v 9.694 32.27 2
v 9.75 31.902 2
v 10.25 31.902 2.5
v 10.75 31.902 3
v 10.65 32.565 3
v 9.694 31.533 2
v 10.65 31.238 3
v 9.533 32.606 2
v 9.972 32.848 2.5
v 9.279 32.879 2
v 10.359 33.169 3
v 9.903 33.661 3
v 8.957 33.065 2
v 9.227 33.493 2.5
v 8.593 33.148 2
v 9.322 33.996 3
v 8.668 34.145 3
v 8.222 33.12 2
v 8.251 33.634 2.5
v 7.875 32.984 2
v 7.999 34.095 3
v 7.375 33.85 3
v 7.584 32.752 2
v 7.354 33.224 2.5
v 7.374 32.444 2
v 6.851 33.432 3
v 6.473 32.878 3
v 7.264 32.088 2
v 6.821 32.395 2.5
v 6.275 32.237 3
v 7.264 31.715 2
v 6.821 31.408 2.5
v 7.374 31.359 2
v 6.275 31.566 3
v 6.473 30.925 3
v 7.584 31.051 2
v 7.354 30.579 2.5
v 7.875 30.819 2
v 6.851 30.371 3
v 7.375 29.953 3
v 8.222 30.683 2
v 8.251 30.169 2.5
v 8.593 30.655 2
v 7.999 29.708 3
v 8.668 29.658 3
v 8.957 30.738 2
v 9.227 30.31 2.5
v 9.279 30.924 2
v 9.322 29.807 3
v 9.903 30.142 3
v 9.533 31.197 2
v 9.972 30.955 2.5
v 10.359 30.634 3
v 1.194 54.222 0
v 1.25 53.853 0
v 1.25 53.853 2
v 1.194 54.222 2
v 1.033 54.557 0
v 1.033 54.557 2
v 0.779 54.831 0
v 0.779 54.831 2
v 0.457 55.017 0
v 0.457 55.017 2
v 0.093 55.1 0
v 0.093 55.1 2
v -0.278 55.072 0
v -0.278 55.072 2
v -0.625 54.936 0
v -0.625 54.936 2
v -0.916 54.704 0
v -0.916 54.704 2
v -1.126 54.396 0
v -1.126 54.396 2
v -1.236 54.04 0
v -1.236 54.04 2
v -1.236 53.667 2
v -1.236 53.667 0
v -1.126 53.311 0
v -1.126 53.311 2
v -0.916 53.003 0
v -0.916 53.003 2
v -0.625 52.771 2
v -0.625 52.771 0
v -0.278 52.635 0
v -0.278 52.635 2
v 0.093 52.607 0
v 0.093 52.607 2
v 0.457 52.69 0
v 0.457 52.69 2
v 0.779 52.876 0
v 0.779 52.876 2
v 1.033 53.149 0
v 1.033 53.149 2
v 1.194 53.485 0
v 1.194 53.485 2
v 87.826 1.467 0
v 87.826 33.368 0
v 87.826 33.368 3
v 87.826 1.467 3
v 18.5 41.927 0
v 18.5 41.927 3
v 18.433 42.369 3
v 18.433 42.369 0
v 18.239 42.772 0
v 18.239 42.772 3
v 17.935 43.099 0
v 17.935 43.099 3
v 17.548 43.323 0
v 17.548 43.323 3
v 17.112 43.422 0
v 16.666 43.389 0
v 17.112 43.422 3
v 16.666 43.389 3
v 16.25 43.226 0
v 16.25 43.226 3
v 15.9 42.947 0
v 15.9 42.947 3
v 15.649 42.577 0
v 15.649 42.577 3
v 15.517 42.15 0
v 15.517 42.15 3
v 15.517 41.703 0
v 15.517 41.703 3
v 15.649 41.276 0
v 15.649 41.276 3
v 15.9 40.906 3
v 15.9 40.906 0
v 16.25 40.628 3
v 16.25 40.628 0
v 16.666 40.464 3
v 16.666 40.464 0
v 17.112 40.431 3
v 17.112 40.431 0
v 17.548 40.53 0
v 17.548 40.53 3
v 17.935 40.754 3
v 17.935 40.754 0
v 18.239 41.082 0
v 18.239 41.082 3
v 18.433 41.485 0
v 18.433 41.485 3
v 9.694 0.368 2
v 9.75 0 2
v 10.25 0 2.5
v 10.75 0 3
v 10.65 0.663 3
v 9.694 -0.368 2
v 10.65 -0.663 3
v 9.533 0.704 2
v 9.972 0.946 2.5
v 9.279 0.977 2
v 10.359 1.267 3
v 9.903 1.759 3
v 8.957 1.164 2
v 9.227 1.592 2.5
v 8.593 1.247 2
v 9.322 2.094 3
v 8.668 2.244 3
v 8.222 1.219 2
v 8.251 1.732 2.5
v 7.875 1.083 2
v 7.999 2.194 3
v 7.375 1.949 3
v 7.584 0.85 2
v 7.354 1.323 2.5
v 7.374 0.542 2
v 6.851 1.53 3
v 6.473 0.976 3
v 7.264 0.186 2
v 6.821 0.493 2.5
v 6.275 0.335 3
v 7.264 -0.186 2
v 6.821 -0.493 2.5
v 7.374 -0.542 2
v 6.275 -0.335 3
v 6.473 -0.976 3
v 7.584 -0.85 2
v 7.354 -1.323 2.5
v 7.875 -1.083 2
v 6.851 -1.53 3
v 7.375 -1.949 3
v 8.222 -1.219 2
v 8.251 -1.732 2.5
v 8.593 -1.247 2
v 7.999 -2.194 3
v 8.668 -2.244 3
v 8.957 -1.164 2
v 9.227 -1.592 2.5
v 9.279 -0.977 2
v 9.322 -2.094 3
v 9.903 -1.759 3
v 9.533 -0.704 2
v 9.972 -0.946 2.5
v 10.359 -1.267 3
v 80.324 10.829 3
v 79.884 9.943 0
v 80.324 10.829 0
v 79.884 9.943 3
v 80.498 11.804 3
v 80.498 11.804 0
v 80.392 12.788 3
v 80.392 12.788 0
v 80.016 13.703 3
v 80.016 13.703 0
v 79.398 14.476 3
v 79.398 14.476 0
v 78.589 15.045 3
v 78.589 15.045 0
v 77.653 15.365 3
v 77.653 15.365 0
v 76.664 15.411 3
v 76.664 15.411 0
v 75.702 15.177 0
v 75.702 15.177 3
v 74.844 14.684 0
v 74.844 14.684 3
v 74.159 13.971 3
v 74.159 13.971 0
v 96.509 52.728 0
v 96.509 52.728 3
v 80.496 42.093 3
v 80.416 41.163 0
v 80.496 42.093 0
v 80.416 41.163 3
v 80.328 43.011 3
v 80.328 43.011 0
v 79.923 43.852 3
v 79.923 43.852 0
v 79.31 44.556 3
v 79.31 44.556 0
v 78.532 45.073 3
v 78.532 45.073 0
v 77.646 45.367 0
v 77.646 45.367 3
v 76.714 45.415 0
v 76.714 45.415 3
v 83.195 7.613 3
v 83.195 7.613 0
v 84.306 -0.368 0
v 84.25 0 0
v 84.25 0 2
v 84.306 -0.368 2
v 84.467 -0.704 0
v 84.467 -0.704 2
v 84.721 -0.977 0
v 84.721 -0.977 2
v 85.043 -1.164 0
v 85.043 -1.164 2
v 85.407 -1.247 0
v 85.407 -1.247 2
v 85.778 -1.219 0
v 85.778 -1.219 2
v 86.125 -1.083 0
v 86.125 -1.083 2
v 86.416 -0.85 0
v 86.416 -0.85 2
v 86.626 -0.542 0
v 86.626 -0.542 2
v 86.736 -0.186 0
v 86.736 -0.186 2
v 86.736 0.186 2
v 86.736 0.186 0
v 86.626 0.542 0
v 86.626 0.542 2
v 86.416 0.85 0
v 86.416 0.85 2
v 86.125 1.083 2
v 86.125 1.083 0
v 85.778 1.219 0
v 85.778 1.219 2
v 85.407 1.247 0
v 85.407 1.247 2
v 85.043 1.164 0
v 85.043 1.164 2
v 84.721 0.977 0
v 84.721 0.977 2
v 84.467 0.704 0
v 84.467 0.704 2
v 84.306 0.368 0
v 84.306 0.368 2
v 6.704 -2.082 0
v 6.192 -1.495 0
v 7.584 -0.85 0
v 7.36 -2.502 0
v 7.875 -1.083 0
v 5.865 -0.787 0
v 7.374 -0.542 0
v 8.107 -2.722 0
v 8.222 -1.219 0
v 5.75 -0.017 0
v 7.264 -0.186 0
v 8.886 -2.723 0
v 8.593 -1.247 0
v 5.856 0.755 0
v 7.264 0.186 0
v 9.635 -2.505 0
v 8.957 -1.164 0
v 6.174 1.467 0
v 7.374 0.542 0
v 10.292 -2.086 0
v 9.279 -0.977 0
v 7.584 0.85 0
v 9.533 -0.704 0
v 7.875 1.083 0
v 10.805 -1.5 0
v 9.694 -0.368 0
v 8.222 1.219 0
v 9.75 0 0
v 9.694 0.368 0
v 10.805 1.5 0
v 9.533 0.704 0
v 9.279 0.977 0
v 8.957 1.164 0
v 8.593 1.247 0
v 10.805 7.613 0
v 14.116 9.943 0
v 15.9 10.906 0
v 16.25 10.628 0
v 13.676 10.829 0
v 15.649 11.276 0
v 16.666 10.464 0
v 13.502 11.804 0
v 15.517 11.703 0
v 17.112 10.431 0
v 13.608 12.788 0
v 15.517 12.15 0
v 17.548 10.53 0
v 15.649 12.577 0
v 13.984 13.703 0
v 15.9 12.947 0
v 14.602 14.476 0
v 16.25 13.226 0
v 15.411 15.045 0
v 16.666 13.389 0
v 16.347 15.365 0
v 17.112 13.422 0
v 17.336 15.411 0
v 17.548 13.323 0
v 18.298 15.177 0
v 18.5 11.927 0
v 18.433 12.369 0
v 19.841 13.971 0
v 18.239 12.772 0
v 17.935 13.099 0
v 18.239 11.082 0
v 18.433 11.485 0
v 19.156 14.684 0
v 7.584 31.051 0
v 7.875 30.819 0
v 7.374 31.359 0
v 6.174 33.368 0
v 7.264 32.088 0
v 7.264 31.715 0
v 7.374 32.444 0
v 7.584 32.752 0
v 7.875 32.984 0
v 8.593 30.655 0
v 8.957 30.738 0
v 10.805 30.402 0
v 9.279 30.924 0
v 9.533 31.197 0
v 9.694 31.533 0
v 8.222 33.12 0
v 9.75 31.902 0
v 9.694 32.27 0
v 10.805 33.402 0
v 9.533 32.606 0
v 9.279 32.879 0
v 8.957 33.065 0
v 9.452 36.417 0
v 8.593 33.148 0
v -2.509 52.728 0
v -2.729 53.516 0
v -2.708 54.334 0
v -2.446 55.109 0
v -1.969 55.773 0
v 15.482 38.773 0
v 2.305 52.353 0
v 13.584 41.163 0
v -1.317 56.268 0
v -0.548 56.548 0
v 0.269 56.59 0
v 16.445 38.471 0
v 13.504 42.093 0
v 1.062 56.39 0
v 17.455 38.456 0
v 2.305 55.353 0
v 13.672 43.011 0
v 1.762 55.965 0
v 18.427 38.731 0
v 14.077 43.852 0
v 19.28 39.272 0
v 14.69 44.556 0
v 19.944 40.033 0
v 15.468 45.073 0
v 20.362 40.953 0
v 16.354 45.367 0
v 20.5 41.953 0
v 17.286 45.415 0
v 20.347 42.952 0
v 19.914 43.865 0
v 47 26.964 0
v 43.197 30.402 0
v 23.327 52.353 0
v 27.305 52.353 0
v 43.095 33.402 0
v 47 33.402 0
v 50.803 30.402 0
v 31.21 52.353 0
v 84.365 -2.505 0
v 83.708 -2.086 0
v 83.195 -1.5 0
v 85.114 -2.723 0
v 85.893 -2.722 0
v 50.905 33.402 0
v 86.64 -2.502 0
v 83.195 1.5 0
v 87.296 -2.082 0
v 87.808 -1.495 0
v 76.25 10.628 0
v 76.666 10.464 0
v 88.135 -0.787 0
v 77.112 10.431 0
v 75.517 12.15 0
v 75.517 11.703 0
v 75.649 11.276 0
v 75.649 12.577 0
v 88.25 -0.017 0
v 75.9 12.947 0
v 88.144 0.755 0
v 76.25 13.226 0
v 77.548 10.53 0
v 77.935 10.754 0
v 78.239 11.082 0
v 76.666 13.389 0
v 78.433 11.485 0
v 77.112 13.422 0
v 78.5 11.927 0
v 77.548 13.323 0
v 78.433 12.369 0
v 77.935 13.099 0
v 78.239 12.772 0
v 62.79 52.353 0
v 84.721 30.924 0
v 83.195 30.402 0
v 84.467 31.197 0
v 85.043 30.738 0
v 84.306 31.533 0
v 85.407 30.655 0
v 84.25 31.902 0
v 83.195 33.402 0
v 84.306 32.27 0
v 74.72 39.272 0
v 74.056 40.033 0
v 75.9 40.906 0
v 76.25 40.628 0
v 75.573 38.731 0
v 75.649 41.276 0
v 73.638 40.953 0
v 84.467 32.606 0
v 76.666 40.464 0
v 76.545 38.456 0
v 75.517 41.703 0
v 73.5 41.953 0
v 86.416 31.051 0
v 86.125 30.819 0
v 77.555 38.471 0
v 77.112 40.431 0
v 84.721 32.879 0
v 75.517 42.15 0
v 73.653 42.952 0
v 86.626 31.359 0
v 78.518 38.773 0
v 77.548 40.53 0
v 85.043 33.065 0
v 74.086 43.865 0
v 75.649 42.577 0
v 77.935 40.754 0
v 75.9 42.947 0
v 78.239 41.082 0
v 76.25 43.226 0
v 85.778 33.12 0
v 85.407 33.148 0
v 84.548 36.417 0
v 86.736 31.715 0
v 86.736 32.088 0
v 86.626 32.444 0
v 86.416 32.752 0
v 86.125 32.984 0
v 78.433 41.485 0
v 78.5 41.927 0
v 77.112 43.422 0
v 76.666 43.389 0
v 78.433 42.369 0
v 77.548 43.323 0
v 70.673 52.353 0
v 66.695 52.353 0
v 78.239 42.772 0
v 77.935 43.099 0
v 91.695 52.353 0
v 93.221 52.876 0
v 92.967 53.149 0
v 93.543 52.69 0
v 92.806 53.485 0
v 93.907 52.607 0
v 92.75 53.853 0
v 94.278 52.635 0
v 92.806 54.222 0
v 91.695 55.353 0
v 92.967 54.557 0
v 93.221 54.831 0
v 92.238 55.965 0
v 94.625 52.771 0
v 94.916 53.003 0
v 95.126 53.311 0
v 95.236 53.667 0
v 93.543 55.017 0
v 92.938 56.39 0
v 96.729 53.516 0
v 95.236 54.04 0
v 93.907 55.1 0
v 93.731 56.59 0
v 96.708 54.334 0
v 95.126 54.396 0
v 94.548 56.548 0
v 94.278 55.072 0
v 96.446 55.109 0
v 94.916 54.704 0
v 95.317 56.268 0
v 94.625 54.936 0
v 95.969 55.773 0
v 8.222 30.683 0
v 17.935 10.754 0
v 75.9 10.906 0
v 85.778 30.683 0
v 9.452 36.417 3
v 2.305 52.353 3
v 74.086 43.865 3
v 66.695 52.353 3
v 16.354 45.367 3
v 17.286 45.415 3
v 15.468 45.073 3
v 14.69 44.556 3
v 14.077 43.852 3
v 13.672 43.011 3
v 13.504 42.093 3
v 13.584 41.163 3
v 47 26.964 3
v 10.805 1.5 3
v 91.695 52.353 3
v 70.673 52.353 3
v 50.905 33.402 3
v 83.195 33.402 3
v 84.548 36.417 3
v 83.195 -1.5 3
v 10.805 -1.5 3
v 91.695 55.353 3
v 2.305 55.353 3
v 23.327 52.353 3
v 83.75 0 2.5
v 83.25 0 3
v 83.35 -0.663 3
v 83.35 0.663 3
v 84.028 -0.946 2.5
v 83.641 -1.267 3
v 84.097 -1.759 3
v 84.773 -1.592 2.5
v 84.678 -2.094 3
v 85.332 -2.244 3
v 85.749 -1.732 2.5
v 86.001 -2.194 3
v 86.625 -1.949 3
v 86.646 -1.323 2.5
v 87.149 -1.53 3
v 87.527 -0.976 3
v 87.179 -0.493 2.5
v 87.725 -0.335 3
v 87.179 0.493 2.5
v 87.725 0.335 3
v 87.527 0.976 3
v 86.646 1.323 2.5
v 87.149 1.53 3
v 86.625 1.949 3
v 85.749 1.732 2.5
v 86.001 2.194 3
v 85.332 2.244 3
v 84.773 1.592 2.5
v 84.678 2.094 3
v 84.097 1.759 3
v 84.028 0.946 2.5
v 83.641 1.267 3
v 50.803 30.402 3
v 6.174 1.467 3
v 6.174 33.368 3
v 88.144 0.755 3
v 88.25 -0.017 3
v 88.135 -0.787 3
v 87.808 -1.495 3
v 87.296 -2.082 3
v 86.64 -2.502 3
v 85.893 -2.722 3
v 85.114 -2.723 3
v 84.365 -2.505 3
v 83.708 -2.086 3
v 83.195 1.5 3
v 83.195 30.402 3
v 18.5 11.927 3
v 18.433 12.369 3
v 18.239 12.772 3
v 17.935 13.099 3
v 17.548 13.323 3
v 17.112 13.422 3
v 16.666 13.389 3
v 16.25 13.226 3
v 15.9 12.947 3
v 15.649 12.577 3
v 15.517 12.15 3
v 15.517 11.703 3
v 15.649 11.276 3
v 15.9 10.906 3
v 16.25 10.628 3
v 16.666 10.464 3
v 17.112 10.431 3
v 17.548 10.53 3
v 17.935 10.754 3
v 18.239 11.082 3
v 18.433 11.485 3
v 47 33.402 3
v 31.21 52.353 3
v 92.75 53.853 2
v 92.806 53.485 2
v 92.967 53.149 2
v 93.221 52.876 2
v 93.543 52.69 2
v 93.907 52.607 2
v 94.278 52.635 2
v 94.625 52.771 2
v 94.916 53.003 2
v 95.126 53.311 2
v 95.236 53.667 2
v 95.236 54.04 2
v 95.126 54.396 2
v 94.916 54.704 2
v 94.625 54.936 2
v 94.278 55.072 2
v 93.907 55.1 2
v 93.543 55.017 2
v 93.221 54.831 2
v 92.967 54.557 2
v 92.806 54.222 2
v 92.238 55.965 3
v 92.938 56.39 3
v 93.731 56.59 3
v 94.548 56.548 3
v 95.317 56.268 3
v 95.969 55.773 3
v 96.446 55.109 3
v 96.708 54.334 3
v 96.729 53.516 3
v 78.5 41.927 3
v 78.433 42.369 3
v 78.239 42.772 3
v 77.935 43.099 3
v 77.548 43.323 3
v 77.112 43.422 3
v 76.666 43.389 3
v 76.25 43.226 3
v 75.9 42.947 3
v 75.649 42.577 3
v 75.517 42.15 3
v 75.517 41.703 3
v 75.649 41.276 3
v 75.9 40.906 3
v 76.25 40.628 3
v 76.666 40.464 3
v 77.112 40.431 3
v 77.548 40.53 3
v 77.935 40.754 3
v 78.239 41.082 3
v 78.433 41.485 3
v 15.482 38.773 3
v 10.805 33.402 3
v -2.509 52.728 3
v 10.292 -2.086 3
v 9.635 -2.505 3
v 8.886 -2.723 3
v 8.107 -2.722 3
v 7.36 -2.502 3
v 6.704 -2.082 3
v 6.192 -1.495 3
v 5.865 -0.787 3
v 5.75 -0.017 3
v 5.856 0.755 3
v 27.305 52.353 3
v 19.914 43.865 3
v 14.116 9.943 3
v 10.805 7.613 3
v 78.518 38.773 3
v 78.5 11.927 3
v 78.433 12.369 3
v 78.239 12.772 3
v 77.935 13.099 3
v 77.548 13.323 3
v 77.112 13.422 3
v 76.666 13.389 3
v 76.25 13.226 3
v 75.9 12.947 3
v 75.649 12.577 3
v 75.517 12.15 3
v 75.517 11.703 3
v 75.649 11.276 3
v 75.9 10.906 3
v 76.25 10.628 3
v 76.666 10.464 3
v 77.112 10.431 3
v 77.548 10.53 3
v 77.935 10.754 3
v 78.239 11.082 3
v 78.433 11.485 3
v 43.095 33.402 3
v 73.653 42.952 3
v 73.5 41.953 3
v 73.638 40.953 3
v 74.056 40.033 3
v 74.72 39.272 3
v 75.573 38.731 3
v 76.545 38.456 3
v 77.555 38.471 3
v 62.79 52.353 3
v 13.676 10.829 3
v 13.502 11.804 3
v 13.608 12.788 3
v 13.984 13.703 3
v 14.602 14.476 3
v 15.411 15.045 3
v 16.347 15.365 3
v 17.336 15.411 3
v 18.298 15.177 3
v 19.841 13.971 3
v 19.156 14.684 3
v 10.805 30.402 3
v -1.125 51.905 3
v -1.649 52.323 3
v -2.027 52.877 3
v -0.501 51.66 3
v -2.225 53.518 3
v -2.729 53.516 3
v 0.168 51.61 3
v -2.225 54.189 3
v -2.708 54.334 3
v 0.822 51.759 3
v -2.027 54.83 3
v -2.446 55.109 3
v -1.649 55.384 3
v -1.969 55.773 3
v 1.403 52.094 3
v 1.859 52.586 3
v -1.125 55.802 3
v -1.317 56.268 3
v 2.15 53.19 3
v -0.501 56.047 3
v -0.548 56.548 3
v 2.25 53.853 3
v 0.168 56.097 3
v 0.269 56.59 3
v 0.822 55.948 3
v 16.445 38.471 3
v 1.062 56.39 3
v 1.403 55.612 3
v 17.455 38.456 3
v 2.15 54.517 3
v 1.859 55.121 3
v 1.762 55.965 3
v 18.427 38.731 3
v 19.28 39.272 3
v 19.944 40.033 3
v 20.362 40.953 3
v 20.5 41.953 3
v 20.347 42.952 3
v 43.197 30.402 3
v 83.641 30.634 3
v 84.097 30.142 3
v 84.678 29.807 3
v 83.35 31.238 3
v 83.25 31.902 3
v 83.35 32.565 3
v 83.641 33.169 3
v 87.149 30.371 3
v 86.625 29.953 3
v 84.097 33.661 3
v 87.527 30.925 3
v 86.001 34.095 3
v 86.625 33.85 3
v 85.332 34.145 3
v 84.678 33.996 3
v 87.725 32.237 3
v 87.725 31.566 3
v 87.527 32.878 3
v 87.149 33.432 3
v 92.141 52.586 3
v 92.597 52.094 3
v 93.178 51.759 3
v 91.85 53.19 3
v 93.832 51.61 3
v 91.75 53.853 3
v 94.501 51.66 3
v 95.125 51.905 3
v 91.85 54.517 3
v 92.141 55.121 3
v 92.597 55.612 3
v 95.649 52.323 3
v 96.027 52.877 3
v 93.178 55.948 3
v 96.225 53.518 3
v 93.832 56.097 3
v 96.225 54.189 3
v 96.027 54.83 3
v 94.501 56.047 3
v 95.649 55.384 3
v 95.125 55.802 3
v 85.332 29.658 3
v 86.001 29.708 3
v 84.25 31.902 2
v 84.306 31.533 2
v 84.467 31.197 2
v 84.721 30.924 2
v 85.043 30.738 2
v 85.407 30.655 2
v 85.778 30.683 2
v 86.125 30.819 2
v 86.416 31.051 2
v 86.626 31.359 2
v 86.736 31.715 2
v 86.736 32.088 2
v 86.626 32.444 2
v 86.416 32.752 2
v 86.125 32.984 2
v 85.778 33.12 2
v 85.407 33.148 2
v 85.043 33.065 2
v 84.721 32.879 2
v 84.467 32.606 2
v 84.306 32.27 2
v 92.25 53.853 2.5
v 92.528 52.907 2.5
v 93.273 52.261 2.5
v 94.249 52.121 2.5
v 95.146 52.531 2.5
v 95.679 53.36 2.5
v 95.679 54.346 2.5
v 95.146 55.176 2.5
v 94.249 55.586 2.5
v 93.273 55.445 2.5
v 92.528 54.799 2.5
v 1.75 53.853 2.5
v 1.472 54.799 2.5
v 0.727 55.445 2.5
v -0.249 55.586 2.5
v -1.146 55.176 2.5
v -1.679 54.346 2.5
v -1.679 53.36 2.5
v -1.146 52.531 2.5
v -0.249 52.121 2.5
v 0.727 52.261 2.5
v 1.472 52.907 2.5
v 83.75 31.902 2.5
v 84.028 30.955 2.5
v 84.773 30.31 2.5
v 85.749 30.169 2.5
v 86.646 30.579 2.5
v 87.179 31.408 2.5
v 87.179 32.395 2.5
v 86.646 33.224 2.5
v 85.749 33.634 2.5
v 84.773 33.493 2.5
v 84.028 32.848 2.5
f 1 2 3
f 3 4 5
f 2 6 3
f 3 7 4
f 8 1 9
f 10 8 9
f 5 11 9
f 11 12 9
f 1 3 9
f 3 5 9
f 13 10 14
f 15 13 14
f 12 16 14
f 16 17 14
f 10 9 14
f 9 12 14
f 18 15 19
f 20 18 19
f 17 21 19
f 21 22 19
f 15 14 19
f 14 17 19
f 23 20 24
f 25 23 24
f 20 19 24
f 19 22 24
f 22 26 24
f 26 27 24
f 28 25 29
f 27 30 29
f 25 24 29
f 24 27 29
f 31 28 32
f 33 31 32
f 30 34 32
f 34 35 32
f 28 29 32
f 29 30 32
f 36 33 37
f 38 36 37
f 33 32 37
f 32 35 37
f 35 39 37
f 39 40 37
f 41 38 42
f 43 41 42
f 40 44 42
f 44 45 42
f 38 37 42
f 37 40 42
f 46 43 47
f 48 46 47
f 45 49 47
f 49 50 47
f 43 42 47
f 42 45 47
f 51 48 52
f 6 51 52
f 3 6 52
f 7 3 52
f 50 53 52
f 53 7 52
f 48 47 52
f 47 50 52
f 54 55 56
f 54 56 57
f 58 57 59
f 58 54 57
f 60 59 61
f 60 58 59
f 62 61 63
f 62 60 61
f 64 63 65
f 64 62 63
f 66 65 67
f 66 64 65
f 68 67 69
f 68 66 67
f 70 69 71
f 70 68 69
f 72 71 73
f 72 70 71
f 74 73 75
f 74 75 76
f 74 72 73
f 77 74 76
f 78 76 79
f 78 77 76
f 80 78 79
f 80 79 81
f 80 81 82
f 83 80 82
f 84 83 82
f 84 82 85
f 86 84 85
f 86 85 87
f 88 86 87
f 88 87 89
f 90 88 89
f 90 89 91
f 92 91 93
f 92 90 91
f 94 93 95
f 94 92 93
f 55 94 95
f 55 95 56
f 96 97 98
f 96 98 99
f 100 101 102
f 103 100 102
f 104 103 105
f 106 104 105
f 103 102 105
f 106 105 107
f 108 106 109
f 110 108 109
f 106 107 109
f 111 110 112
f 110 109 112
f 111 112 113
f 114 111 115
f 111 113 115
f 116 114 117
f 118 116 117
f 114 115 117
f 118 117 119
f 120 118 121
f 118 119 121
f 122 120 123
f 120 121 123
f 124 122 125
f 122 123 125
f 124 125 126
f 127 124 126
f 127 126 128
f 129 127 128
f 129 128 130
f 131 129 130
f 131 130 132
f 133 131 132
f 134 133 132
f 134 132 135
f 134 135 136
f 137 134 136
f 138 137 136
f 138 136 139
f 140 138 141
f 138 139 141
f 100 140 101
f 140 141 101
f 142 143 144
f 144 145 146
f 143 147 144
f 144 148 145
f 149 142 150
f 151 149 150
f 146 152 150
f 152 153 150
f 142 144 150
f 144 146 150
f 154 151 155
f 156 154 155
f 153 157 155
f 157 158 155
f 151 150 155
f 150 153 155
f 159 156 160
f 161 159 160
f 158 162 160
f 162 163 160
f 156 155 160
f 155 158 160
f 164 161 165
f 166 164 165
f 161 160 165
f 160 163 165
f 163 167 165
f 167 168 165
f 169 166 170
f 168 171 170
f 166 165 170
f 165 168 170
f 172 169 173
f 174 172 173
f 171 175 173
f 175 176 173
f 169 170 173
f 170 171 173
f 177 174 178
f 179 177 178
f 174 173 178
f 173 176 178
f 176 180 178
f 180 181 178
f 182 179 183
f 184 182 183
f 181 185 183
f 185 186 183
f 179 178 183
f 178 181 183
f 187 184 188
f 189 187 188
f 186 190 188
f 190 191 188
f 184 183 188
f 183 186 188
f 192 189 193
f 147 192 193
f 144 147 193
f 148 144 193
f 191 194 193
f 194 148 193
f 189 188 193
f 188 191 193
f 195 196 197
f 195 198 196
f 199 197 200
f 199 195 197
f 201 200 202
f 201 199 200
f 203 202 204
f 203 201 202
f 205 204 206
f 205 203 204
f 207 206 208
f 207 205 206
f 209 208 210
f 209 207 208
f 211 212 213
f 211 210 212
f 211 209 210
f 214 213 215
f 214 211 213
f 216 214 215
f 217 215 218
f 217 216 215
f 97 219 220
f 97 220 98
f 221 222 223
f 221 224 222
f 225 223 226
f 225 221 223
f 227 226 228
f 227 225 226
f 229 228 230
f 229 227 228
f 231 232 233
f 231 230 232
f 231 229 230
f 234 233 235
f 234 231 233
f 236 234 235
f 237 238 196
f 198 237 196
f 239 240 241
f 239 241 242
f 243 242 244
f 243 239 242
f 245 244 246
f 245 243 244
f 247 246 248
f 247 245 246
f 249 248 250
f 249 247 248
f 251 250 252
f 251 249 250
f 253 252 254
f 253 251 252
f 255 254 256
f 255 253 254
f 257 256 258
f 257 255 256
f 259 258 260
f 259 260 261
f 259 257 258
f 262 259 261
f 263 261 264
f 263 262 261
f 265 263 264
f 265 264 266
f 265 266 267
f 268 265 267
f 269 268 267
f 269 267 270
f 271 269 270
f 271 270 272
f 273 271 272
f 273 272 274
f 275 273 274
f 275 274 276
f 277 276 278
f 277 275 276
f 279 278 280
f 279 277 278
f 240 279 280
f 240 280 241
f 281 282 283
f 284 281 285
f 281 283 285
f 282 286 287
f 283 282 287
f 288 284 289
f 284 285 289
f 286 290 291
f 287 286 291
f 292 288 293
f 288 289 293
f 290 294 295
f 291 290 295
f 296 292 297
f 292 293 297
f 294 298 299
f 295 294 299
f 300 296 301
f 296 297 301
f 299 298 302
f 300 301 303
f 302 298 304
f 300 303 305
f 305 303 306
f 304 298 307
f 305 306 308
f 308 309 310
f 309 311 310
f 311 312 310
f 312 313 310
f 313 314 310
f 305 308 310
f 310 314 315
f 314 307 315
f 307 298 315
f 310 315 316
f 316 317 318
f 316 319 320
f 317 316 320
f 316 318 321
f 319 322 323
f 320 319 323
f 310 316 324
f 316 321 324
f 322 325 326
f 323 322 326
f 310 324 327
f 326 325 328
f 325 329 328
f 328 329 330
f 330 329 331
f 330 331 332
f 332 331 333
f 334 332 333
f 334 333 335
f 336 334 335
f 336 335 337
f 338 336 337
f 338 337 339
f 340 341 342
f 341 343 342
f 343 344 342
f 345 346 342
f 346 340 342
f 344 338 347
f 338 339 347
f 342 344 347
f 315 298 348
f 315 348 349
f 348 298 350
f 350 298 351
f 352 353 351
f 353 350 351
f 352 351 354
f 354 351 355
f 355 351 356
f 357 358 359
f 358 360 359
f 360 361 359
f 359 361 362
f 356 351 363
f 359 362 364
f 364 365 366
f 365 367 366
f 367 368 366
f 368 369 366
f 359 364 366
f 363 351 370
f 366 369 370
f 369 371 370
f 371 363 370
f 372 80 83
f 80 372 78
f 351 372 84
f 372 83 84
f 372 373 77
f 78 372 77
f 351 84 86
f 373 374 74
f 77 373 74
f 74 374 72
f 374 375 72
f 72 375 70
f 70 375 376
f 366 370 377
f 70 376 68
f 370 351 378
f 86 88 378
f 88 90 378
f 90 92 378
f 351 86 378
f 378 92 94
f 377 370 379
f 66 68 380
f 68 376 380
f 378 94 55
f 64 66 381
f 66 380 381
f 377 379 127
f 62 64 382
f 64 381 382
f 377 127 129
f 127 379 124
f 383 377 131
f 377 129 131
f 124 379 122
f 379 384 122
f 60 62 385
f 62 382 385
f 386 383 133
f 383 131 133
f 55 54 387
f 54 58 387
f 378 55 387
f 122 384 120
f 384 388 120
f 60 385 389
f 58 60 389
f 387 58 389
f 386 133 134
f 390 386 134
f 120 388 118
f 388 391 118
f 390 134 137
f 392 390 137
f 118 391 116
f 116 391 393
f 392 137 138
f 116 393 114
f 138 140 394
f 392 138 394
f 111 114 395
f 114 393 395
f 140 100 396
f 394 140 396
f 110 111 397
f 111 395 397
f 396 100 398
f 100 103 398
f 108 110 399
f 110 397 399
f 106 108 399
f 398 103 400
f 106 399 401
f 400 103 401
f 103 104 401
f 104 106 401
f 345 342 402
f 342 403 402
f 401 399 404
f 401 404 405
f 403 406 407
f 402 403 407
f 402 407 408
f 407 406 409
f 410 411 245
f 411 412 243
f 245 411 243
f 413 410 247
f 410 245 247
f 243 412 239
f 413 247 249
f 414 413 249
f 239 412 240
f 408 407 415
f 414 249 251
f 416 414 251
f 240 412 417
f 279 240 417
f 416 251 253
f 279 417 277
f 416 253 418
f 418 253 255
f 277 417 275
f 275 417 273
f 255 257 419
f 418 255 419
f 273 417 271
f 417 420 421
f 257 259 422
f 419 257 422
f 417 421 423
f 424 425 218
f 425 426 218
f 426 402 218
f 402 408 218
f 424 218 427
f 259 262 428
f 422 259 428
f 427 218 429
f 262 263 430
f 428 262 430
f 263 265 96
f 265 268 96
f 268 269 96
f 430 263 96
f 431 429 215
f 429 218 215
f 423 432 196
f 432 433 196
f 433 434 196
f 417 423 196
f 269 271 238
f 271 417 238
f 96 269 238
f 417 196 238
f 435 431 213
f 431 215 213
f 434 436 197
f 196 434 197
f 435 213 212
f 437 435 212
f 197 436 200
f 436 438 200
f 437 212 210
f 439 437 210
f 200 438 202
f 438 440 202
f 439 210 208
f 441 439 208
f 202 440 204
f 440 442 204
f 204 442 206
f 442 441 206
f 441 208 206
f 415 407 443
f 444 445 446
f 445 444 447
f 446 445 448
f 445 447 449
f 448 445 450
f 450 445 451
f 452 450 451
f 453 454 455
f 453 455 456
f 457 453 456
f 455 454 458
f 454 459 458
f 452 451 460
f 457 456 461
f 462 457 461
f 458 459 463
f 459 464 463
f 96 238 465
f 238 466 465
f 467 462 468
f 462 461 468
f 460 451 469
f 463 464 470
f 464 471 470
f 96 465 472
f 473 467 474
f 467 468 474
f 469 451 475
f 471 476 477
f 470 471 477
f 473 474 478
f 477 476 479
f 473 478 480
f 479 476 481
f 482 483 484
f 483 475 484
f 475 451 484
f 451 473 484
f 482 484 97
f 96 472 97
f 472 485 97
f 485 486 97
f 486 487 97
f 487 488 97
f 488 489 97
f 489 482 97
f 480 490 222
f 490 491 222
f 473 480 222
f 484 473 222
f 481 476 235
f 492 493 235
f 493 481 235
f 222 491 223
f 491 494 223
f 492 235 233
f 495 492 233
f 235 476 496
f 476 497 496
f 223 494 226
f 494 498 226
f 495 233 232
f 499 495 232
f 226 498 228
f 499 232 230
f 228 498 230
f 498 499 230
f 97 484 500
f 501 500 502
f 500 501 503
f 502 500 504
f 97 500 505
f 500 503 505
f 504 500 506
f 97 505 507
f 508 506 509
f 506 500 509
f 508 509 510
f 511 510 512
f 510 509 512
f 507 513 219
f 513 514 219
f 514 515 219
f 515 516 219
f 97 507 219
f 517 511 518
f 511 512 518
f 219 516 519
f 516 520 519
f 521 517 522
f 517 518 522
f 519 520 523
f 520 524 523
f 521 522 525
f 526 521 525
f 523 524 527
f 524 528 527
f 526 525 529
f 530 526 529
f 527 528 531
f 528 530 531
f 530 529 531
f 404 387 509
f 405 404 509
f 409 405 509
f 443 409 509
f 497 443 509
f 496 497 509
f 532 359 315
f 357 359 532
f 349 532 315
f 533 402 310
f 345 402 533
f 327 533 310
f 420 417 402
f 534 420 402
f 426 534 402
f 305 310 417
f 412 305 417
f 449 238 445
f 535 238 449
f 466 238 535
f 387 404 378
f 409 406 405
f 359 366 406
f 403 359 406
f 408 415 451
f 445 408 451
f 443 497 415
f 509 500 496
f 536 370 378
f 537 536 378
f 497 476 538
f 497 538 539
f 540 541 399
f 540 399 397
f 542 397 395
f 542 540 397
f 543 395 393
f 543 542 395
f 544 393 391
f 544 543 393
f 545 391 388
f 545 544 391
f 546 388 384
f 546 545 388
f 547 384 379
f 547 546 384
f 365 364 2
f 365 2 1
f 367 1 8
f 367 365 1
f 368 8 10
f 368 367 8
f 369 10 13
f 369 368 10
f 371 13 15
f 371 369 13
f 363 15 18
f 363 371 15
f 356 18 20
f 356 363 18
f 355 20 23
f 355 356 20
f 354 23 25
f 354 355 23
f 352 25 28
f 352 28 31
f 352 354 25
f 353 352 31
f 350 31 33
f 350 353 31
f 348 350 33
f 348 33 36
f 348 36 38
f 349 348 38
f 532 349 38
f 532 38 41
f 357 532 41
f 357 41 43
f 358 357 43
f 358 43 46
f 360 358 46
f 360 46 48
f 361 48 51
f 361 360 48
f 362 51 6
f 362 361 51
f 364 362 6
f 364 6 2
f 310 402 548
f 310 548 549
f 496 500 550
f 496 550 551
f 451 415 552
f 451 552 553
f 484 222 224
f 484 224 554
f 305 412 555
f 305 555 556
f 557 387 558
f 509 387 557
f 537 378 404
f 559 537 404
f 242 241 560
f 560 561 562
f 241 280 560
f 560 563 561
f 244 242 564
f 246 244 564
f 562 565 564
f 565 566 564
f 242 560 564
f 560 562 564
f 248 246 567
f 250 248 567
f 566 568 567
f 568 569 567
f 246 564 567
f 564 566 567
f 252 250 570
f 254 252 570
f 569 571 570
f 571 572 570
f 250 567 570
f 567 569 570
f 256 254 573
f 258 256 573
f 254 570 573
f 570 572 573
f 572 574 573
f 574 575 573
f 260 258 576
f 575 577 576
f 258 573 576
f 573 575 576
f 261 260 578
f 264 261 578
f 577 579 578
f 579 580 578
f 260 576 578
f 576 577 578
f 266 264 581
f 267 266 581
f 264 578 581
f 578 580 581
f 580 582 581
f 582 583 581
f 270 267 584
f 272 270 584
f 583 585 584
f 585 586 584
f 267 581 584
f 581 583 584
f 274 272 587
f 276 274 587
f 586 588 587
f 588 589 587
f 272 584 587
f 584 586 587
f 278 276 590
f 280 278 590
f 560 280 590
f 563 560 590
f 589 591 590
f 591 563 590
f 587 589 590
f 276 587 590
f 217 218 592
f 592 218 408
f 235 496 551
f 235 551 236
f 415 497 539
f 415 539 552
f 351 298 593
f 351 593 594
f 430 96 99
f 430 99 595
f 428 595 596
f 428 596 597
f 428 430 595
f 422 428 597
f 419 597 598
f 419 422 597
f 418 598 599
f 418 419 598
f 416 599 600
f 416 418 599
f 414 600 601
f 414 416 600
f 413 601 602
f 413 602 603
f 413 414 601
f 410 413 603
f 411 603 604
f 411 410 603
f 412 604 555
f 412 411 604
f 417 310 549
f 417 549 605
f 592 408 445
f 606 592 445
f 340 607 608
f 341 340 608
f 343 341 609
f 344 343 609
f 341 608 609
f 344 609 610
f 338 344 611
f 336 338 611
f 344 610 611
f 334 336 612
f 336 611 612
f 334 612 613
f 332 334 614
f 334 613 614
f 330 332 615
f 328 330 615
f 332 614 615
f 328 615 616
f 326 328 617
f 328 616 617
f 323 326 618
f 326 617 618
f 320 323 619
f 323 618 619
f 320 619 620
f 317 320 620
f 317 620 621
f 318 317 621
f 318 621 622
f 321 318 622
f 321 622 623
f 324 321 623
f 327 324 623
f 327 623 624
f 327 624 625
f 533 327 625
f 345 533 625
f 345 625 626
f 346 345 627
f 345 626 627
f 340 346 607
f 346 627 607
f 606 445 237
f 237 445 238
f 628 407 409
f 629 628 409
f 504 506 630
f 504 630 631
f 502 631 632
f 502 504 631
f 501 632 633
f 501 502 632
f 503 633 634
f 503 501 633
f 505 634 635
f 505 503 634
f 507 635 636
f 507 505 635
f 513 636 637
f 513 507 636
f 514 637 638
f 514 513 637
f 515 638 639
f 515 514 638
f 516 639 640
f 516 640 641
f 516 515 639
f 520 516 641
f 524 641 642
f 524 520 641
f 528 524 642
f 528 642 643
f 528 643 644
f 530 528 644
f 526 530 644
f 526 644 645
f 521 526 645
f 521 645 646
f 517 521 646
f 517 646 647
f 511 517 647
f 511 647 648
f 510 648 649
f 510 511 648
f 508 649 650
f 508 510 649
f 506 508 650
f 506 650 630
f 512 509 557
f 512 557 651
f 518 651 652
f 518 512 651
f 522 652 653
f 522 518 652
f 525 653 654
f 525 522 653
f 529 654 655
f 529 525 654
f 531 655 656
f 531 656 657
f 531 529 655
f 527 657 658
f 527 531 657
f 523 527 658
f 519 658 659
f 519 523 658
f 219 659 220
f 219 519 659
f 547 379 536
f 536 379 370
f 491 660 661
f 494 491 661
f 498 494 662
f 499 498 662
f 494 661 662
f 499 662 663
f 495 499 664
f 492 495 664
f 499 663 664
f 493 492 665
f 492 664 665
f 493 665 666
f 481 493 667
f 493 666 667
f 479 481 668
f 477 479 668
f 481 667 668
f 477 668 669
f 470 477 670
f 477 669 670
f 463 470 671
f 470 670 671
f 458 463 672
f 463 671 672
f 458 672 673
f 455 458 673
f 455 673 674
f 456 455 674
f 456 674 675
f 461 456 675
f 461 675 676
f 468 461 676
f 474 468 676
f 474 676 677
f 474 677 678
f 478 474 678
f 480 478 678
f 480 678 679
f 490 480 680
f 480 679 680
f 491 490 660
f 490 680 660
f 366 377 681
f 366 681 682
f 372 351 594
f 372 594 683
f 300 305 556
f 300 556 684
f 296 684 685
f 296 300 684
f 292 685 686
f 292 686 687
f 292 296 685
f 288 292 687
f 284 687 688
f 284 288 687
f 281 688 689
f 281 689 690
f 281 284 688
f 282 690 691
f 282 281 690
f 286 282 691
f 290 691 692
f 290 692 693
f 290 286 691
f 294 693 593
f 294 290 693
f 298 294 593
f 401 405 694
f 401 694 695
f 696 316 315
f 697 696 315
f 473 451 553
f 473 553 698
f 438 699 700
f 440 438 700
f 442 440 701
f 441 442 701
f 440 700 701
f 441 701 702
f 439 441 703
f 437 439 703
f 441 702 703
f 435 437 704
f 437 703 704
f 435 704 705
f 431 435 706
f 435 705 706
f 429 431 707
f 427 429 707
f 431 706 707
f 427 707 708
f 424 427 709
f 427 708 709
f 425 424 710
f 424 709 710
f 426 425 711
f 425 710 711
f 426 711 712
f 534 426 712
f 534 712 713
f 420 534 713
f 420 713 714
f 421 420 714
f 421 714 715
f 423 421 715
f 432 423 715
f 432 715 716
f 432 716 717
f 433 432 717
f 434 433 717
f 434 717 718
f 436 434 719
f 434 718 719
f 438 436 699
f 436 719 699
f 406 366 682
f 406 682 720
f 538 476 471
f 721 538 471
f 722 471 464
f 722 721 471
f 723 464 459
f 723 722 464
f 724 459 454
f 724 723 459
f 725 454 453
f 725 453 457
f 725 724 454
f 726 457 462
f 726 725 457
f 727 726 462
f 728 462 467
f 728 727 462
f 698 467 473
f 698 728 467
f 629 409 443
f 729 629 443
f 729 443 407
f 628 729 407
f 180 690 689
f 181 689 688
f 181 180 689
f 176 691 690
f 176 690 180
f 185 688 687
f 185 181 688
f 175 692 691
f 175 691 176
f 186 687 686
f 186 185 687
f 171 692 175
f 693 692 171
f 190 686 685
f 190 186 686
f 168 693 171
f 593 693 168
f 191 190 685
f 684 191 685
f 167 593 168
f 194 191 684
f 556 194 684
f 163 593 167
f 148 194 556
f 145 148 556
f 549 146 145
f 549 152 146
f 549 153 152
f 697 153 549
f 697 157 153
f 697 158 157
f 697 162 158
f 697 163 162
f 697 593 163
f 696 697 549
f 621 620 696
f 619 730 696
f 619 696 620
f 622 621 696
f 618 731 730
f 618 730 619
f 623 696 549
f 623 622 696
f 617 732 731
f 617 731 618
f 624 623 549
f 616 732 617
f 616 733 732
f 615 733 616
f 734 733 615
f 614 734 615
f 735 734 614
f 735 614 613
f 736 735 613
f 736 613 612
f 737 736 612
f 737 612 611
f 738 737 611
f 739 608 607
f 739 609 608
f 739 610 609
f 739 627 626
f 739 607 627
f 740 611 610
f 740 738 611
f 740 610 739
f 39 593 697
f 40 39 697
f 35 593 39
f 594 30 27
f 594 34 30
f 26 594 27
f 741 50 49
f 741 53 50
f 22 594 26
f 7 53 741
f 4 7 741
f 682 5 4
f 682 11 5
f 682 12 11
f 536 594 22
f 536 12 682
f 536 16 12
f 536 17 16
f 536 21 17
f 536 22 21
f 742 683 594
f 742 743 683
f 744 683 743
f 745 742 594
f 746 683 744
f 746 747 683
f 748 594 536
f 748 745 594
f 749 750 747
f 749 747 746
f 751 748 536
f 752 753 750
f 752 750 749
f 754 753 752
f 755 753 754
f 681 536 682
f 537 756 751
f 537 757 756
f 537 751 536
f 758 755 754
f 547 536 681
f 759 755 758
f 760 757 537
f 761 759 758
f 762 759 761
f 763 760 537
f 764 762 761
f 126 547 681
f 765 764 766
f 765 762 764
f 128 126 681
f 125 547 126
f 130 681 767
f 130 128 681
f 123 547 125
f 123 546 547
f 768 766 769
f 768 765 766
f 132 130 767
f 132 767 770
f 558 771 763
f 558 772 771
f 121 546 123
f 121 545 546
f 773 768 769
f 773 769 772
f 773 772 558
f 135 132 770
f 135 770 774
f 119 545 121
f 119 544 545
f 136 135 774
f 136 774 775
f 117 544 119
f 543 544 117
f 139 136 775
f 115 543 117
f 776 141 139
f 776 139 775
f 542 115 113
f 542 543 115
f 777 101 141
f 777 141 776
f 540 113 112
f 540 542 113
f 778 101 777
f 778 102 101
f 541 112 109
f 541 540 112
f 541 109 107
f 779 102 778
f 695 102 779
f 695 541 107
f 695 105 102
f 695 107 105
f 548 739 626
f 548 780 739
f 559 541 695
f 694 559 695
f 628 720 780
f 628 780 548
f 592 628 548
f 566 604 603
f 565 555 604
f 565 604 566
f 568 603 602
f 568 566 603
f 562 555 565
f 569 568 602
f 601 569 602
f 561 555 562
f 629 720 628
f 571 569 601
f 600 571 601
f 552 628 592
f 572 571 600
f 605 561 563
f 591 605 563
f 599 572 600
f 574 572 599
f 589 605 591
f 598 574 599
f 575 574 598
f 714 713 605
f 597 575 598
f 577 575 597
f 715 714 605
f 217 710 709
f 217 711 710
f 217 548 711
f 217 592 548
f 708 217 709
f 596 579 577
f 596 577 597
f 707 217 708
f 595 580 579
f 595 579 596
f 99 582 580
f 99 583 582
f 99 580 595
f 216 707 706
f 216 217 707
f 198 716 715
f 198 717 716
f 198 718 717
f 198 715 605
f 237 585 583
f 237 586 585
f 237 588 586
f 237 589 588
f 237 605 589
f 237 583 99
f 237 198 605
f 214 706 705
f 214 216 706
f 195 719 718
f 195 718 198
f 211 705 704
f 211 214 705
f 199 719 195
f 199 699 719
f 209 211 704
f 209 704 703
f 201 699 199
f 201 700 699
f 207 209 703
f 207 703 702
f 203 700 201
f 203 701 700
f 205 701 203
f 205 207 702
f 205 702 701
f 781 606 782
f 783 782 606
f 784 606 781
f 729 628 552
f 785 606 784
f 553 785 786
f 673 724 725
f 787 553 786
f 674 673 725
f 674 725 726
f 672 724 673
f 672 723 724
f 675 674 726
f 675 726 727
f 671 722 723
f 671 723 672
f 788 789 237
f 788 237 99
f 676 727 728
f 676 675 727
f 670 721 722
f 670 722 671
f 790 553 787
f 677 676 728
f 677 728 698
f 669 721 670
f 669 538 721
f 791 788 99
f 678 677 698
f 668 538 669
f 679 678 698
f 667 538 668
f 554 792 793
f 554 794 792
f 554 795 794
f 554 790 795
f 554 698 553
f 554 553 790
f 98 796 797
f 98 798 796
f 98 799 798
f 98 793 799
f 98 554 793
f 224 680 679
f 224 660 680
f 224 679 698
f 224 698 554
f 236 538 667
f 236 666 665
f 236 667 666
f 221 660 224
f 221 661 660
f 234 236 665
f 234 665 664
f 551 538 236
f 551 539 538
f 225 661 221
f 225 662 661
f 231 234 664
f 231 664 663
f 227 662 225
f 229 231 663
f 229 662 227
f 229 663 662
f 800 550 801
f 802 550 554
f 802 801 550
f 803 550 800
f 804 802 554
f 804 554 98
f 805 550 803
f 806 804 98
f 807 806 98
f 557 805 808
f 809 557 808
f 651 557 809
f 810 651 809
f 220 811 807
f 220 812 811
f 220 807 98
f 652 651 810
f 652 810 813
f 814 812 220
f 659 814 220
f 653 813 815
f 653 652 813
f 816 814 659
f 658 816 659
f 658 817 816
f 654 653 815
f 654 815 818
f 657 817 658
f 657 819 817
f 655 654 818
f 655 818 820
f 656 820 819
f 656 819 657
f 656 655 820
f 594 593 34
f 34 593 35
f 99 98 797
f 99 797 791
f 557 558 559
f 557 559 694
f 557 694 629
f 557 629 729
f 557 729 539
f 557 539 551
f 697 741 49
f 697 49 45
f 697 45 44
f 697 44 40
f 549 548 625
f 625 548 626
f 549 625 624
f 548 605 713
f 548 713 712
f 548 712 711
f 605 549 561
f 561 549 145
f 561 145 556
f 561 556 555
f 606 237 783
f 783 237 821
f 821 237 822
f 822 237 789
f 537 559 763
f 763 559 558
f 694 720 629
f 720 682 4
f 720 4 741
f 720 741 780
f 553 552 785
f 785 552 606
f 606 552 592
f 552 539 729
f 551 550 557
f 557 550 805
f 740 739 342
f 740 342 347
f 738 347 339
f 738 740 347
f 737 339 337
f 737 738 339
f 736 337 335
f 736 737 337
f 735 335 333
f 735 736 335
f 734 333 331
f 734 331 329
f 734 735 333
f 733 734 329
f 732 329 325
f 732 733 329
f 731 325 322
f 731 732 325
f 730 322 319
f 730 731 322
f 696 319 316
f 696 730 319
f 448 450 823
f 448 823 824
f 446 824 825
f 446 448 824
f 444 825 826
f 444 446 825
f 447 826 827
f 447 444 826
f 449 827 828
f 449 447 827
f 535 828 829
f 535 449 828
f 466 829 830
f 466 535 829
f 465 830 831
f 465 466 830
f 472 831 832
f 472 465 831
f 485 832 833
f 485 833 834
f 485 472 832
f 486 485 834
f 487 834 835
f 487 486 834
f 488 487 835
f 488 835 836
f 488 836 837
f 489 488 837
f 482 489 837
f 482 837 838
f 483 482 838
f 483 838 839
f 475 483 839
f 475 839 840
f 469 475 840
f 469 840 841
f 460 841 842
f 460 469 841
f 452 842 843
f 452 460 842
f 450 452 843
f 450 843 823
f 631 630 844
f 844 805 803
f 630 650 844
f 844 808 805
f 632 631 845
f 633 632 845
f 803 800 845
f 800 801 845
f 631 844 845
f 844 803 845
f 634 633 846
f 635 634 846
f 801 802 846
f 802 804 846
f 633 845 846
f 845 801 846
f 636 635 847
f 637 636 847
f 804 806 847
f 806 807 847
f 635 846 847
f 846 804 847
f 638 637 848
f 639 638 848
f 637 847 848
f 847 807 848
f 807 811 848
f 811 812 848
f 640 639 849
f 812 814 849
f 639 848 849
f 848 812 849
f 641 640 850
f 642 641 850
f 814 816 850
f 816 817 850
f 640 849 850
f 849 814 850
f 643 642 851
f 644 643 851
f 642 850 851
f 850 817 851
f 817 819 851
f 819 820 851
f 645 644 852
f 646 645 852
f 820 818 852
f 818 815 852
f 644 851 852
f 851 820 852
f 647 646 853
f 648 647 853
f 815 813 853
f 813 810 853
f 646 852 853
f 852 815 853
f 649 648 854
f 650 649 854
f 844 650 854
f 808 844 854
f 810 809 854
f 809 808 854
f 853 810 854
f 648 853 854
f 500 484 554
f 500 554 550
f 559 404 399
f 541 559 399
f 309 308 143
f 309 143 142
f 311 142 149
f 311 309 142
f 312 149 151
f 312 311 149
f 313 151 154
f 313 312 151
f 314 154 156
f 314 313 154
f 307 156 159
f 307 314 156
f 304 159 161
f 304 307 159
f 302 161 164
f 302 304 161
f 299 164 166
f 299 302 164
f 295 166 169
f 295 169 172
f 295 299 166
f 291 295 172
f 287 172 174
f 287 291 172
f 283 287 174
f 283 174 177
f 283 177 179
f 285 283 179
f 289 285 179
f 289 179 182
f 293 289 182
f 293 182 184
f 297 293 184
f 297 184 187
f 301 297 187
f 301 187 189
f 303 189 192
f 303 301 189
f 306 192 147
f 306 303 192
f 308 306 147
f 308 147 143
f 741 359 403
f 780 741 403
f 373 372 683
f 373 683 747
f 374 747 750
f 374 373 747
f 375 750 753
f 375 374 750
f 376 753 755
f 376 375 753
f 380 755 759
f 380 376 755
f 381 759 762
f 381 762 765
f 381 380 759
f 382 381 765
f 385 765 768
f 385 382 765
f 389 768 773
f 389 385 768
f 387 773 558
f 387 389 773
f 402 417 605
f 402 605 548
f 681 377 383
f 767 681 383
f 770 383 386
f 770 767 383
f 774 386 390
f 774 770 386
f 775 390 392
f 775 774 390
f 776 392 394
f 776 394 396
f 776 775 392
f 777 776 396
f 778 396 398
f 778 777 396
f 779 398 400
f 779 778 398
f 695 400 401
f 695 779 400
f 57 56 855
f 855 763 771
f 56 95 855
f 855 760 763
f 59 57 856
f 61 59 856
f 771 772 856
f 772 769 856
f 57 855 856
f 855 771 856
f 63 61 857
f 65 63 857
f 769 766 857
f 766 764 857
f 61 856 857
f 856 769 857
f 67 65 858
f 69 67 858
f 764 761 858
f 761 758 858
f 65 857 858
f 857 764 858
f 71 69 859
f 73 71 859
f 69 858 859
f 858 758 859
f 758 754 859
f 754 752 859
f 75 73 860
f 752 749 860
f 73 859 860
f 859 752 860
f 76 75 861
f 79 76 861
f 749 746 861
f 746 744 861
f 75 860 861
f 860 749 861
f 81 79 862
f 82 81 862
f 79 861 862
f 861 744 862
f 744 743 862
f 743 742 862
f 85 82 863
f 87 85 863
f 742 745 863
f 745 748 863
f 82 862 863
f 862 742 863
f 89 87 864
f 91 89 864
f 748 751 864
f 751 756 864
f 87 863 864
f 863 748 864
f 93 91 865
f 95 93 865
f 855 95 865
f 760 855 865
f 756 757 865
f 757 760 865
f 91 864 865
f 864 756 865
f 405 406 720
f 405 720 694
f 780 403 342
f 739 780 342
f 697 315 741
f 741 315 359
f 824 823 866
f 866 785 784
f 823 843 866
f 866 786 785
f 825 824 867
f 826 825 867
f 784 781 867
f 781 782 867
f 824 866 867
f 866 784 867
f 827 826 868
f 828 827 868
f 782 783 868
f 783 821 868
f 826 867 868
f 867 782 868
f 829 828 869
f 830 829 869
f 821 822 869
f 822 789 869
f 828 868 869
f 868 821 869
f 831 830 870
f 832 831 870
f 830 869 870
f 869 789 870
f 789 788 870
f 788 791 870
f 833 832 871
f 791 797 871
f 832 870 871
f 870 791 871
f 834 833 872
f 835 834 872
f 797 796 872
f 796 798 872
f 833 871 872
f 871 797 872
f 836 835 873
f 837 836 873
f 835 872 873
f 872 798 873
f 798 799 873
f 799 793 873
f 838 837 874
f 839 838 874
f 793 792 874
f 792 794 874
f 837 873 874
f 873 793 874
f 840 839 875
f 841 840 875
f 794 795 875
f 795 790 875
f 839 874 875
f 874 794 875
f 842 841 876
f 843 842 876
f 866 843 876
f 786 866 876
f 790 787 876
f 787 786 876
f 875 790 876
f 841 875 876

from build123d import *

# Parameters (mm, degrees)
SKETCH1_R           = 1.25
BOSS_EXTRUDE1_DEPTH = 3
CHAMFER1_SIZE       = 1
SKETCH2_R           = 3.5
BOSS_EXTRUDE2_DEPTH = 3
SKETCH2_3_R         = 1.5
CUT_EXTRUDE1_DEPTH  = 3


with BuildPart() as part:
    # Sketch1 → Boss-Extrude1 (new body)
    with BuildSketch(Plane.XY):
        with BuildLine():
            Line((6.173773471, 33.368208058), (-2.509184891, 52.727938114))
            ThreePointArc((-2.509184891, 52.727938114), (-1.316660917, 56.267635348), (2.304886114, 55.353323017))
            Line((2.304886114, 55.353323017), (91.695113886, 55.353323017))
            ThreePointArc((91.695113886, 55.353323017), (95.316660917, 56.267635348), (96.509184891, 52.727938114))
            Line((96.509184891, 52.727938114), (87.826226529, 33.368208058))
            Line((87.826226529, 33.368208058), (87.826226529, 1.466686789))
            ThreePointArc((87.826226529, 1.466686789), (86.983381771, -2.315616229), (83.195113886, -1.5))
            Line((83.195113886, -1.5), (10.804886114, -1.5))
            ThreePointArc((10.804886114, -1.5), (7.016618229, -2.315616229), (6.173773471, 1.466686789))
            Line((6.173773471, 1.466686789), (6.173773471, 33.368208058))
        make_face()
        with Locations((0, 53.853323017)):
            Circle(SKETCH1_R, mode=Mode.SUBTRACT)
        with Locations((8.5, 31.901521269)):
            Circle(SKETCH1_R, mode=Mode.SUBTRACT)
        with Locations((8.5, 0)):
            Circle(SKETCH1_R, mode=Mode.SUBTRACT)
        with Locations(Location((85.5, 0, 0), (0, 0, 180))):
            Circle(SKETCH1_R, mode=Mode.SUBTRACT)
        with Locations(Location((85.5, 31.901521269, 0), (0, 0, 180))):
            Circle(SKETCH1_R, mode=Mode.SUBTRACT)
        with Locations(Location((94, 53.853323017, 0), (0, 0, 180))):
            Circle(SKETCH1_R, mode=Mode.SUBTRACT)
        Polygon((9.452473834, 36.416891788), (2.304886114, 52.353323017), (23.327202938, 52.353323017), align=None, mode=Mode.SUBTRACT)
        Polygon((10.804886114, 33.401521269), (43.095167668, 33.401521269), (27.304886114, 52.353323017), align=None, mode=Mode.SUBTRACT)
        Polygon((10.804886114, 30.401521269), (43.196670996, 30.401521269), (10.804886114, 7.613376738), align=None, mode=Mode.SUBTRACT)
        Polygon((10.804886114, 1.5), (83.195113886, 1.5), (47, 26.963847996), align=None, mode=Mode.SUBTRACT)
        Polygon((83.195113886, 30.401521269), (83.195113886, 7.613376738), (50.803329004, 30.401521269), align=None, mode=Mode.SUBTRACT)
        Polygon((84.547526166, 36.416891788), (91.695113886, 52.353323017), (70.672797062, 52.353323017), align=None, mode=Mode.SUBTRACT)
        Polygon((47, 33.401521269), (31.209718446, 52.353323017), (62.790281554, 52.353323017), align=None, mode=Mode.SUBTRACT)
        Polygon((50.904832332, 33.401521269), (83.195113886, 33.401521269), (66.695113886, 52.353323017), align=None, mode=Mode.SUBTRACT)
    extrude(amount=BOSS_EXTRUDE1_DEPTH)

    # Chamfer1
    chamfer1_edges = [part.edges().sort_by_distance(p)[0] for p in [
        (86.75, 0, 3),
        (86.75, 31.901521269, 3),
        (95.25, 53.853323017, 3),
        (-1.25, 53.853323017, 3),
        (7.25, 31.901521269, 3),
        (7.25, 0, 3),
    ]]
    chamfer(chamfer1_edges, length=CHAMFER1_SIZE)

    # Sketch2 → Boss-Extrude2 (add)
    with BuildSketch(Plane.XY.offset(3)):
        with Locations((17, 41.926661509)):
            Circle(SKETCH2_R)
        with Locations((17, 11.926661509)):
            Circle(SKETCH2_R)
        with Locations((77, 41.926661509)):
            Circle(SKETCH2_R)
        with Locations((77, 11.926661509)):
            Circle(SKETCH2_R)
    extrude(amount=-BOSS_EXTRUDE2_DEPTH)

    # Sketch2<3> → Cut-Extrude1 (cut)
    with BuildSketch(Plane.XY.offset(3)):
        with Locations((17, 11.926661509)):
            Circle(SKETCH2_3_R)
        with Locations((77, 11.926661509)):
            Circle(SKETCH2_3_R)
        with Locations((17, 41.926661509)):
            Circle(SKETCH2_3_R)
        with Locations((77, 41.926661509)):
            Circle(SKETCH2_3_R)
    extrude(amount=-CUT_EXTRUDE1_DEPTH, mode=Mode.SUBTRACT)


solid = part.part
